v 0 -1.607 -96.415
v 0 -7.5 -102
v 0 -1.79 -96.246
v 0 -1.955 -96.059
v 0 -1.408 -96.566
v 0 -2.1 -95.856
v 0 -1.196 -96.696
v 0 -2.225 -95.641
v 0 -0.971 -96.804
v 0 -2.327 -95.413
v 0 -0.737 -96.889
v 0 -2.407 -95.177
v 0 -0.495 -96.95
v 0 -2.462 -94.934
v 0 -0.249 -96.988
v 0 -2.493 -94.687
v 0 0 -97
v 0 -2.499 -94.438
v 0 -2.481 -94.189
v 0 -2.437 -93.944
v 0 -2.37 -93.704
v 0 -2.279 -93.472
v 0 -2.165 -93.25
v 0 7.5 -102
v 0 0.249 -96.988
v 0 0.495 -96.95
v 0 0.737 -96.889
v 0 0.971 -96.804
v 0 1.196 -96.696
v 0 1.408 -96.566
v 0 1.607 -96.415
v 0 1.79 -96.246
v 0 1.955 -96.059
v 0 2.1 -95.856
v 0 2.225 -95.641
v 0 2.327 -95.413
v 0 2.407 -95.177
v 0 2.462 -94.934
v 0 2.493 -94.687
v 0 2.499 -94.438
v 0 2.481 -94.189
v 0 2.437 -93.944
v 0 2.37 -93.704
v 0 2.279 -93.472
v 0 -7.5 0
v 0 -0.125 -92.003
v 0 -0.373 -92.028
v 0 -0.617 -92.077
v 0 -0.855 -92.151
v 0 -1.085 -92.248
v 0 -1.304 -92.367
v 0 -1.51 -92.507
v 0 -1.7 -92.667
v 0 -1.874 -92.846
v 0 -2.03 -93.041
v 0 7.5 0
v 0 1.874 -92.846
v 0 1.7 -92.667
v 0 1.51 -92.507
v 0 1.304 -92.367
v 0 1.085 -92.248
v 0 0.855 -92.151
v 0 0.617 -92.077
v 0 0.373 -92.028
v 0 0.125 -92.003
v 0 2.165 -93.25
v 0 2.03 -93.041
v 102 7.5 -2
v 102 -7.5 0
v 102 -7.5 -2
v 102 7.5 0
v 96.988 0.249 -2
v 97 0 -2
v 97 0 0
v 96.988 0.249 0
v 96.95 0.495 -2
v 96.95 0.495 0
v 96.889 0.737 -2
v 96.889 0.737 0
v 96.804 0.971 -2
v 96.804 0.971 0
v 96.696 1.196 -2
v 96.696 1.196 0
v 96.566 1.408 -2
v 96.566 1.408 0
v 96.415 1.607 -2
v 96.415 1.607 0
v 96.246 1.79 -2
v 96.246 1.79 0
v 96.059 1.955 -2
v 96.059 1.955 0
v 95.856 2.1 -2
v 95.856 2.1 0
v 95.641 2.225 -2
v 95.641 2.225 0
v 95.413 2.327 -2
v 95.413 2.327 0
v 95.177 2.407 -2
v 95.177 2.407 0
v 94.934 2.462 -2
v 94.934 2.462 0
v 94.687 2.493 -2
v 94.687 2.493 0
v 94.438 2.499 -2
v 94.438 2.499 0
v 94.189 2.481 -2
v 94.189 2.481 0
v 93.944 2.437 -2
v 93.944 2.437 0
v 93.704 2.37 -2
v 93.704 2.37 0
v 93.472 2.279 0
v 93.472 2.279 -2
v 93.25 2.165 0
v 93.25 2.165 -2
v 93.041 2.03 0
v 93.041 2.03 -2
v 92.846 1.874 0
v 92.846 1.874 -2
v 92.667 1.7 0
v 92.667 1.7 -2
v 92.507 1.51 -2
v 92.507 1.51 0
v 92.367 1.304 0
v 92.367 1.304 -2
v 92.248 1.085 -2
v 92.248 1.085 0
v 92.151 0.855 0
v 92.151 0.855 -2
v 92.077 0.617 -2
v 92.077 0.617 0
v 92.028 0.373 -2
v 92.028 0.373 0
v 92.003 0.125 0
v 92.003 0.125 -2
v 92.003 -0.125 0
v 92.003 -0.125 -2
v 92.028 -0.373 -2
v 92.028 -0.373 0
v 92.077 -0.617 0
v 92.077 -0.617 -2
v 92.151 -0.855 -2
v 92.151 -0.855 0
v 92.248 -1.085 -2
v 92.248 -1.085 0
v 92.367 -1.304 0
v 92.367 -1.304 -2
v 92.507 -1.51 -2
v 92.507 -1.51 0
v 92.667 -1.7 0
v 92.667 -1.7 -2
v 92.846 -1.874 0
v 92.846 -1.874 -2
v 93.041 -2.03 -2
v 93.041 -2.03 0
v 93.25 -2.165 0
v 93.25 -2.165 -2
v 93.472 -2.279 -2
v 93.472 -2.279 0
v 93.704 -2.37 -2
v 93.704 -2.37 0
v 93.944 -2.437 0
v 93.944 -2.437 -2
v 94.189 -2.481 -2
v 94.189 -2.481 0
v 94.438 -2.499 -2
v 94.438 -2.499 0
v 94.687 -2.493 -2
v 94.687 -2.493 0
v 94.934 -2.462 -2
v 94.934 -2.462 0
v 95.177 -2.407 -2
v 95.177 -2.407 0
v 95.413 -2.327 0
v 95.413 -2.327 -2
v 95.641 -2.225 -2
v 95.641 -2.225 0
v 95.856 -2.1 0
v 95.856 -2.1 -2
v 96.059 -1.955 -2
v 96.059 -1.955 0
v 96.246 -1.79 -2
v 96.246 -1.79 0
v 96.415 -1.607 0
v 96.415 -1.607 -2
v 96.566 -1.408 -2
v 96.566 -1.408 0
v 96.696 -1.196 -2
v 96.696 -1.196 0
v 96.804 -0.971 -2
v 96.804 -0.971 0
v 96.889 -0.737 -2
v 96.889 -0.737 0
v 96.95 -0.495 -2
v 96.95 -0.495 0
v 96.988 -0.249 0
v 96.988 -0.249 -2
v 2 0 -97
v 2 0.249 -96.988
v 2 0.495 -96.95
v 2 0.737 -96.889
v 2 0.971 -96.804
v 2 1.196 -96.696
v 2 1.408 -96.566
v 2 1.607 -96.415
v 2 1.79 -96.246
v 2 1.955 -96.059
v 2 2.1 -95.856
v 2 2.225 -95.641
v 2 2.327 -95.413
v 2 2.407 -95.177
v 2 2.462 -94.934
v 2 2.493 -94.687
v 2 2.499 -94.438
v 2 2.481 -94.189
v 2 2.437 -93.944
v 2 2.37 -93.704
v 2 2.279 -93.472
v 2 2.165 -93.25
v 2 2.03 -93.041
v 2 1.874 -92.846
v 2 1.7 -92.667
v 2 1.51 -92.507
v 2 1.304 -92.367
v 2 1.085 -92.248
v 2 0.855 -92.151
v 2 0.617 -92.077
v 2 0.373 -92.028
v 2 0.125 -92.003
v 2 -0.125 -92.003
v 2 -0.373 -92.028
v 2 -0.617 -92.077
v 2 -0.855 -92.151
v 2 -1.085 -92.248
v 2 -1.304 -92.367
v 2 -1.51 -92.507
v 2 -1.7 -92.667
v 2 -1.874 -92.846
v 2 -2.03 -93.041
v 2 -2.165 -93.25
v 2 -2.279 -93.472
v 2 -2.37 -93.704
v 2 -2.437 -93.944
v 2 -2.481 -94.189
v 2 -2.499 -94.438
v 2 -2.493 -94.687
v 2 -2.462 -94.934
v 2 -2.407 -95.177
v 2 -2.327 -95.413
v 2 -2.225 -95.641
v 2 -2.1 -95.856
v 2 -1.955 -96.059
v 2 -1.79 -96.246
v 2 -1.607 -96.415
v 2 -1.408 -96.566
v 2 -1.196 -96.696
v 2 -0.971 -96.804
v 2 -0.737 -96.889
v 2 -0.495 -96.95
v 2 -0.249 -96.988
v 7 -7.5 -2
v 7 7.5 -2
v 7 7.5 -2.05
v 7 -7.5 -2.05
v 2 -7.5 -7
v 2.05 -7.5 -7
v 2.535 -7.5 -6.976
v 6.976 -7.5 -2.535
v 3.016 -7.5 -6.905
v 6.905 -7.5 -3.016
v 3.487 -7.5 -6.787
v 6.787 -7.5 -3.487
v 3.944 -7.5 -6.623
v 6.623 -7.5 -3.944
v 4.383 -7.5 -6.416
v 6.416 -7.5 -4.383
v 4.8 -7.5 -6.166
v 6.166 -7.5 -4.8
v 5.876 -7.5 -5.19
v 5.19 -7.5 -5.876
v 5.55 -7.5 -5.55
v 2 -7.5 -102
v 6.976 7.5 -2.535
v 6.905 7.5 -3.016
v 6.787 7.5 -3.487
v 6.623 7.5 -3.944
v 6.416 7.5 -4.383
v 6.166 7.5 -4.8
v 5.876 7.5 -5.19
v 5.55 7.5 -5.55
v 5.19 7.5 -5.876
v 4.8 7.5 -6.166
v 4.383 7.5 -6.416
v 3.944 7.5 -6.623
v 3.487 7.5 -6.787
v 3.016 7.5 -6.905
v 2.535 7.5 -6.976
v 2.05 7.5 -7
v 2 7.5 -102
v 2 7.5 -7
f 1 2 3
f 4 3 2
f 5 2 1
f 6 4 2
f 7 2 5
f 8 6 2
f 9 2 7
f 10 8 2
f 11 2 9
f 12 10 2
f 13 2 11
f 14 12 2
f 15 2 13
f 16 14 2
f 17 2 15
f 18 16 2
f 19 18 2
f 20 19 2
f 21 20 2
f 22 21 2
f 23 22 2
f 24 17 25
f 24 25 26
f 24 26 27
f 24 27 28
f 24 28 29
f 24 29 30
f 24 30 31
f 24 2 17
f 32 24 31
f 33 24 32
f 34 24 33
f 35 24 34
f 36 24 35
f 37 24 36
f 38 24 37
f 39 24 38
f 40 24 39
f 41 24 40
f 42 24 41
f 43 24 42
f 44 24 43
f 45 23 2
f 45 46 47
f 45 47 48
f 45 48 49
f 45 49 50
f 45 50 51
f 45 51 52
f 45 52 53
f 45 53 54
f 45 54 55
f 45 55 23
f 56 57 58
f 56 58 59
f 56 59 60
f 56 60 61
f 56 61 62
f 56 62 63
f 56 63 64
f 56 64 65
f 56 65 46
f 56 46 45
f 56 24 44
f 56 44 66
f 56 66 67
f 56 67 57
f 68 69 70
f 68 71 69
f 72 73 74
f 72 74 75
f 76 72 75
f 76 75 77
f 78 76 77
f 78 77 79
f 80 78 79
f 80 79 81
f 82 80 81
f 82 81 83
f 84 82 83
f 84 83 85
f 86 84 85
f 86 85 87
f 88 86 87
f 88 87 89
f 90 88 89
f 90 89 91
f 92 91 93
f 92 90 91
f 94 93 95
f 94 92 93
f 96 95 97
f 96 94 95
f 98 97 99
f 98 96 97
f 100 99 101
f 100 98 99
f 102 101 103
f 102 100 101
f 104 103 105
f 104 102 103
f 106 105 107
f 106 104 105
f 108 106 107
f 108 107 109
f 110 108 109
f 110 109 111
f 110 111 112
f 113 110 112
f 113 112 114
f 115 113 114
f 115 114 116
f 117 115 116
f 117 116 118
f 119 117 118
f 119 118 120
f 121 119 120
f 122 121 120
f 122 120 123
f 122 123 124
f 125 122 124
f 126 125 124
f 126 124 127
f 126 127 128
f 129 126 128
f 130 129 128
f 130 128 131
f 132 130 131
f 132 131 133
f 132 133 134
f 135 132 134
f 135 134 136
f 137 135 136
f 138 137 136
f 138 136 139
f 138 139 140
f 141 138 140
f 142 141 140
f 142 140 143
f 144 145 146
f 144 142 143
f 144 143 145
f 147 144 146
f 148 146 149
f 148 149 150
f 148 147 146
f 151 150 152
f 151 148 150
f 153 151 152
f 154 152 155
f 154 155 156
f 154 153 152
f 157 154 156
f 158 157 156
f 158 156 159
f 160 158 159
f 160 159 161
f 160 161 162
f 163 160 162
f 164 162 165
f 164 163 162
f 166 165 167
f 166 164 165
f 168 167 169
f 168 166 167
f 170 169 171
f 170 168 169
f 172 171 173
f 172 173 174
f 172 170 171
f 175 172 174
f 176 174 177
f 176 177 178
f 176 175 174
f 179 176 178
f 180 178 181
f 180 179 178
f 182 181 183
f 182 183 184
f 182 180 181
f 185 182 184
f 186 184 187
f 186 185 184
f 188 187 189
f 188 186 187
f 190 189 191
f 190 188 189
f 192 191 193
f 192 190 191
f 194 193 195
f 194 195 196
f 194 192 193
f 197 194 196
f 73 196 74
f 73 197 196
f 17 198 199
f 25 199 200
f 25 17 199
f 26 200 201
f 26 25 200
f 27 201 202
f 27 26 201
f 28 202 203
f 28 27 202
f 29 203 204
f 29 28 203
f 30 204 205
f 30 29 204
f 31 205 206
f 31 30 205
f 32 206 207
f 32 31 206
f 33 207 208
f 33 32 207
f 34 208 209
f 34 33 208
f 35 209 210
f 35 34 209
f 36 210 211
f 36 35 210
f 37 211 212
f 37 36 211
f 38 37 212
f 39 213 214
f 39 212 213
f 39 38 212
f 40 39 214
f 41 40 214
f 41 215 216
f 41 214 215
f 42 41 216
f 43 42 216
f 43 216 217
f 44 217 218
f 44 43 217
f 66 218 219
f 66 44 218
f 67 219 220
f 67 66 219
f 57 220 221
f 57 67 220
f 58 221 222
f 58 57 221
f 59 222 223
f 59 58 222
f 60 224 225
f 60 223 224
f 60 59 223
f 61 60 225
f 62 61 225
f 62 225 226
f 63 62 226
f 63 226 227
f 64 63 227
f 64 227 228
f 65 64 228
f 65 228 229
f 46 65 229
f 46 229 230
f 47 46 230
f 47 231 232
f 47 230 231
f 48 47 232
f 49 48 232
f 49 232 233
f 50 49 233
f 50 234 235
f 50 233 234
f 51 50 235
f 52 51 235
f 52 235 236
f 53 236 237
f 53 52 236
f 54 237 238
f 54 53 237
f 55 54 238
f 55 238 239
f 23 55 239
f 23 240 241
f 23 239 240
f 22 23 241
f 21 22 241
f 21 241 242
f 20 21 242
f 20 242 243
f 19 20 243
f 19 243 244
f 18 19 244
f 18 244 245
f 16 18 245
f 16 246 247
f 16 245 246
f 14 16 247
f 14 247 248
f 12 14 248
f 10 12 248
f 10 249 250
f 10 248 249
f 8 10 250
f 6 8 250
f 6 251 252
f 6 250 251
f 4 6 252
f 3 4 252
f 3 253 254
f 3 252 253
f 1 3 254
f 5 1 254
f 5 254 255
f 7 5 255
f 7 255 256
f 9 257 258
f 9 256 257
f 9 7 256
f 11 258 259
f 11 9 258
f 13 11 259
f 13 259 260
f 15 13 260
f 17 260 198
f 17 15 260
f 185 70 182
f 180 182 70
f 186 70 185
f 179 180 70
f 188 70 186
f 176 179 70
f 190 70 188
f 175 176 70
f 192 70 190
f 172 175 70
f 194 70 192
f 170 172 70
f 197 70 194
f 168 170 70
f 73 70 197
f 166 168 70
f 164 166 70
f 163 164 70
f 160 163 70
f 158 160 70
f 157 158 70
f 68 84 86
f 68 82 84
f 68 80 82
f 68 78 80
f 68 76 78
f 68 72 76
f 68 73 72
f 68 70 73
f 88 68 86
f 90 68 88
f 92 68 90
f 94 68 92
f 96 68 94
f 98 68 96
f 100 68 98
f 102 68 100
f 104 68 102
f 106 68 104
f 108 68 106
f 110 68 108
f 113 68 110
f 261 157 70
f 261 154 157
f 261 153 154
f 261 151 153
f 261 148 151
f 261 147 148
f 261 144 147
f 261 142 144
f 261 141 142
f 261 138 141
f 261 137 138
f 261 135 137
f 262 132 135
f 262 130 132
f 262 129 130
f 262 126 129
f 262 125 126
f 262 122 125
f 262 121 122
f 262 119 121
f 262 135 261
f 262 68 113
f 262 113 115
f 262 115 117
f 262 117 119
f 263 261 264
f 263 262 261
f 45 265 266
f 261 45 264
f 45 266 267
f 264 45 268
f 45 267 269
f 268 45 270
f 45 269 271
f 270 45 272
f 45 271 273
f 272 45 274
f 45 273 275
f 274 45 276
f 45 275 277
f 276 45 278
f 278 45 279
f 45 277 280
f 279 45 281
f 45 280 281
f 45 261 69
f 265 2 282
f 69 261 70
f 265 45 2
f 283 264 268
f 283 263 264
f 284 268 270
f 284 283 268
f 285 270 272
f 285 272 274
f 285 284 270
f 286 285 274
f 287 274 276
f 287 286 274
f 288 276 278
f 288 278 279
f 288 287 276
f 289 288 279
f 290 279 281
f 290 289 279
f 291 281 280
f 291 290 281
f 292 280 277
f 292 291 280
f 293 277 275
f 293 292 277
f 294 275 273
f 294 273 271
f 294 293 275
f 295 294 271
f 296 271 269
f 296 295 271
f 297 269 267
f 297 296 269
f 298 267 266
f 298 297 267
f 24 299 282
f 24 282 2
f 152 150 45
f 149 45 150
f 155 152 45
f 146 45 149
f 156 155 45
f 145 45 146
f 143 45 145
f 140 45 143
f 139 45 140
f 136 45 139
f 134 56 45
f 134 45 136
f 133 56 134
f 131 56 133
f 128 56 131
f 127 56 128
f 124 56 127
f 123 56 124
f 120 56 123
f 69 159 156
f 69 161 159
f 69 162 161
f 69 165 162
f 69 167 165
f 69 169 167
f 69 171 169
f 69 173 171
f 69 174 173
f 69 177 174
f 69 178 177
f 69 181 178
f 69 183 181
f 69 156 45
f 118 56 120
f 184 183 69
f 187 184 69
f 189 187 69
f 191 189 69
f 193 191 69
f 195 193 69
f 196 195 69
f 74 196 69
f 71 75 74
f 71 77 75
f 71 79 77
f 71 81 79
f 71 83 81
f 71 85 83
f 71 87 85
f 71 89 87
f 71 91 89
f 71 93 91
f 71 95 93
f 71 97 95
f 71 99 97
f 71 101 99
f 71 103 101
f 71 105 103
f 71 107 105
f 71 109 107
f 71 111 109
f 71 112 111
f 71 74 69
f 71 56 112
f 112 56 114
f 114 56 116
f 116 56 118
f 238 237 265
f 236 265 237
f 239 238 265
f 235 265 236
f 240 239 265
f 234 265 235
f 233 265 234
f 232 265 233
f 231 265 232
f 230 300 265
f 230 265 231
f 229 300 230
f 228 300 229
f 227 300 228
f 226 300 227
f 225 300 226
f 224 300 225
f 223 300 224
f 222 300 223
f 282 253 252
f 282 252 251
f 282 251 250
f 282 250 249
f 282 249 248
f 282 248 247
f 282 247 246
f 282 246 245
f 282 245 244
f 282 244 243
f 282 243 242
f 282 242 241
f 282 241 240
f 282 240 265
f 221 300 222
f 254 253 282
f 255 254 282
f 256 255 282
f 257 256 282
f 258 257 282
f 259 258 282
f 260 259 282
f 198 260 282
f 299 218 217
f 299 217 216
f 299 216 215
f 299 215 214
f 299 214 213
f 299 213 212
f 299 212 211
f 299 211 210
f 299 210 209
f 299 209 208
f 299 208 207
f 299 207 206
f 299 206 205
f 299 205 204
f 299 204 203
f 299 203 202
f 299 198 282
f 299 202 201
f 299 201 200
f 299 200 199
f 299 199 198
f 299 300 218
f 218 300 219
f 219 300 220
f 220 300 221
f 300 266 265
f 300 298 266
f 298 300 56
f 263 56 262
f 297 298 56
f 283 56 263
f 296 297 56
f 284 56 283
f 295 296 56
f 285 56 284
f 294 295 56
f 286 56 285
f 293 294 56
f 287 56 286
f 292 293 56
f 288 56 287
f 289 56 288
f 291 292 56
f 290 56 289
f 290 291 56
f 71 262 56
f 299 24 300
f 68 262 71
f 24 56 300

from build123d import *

# Parameters (mm, degrees)
PAD_DEPTH            = 7.5
CYLINDER_R           = 2.5
CYLINDER_DEPTH       = 3
CYLINDER001_R        = 2.5
CYLINDER001_DEPTH    = 3
FILLET_R             = 4.95
BODY_PLACEMENT_ANGLE = 270


with BuildPart() as part:
    # Sketch → Pad (new body, symmetric)
    with BuildSketch(Plane.XY):
        Polygon((102, 0), (102, 2), (7, 2), (7, 7), (2, 7), (2, 102), (0, 102), (0, 0), align=None)
    extrude(amount=PAD_DEPTH, both=True)

    # Cylinder → Cylinder (cut)
    with BuildSketch(Plane(origin=(94.5, 3, 0), x_dir=(1, 0, 0), z_dir=(0, -1, 0))):
        Circle(CYLINDER_R)
    extrude(amount=CYLINDER_DEPTH, mode=Mode.SUBTRACT)

    # Cylinder001 → Cylinder001 (cut)
    with BuildSketch(Plane(origin=(0, 94.5, 0), x_dir=(0, 1, 0), z_dir=(1, 0, 0))):
        Circle(CYLINDER001_R)
    extrude(amount=CYLINDER001_DEPTH, mode=Mode.SUBTRACT)

    # Fillet
    fillet_edges = [part.edges().sort_by_distance(p)[0] for p in [
        (7, 7, 0),
    ]]
    fillet(fillet_edges, radius=FILLET_R)


with BuildPart() as part_1:
    # Body placement: moved
    add(part.part.rotate(Axis((0, 0, 0), (1, 0, 0)), BODY_PLACEMENT_ANGLE))


solid = part_1.part
